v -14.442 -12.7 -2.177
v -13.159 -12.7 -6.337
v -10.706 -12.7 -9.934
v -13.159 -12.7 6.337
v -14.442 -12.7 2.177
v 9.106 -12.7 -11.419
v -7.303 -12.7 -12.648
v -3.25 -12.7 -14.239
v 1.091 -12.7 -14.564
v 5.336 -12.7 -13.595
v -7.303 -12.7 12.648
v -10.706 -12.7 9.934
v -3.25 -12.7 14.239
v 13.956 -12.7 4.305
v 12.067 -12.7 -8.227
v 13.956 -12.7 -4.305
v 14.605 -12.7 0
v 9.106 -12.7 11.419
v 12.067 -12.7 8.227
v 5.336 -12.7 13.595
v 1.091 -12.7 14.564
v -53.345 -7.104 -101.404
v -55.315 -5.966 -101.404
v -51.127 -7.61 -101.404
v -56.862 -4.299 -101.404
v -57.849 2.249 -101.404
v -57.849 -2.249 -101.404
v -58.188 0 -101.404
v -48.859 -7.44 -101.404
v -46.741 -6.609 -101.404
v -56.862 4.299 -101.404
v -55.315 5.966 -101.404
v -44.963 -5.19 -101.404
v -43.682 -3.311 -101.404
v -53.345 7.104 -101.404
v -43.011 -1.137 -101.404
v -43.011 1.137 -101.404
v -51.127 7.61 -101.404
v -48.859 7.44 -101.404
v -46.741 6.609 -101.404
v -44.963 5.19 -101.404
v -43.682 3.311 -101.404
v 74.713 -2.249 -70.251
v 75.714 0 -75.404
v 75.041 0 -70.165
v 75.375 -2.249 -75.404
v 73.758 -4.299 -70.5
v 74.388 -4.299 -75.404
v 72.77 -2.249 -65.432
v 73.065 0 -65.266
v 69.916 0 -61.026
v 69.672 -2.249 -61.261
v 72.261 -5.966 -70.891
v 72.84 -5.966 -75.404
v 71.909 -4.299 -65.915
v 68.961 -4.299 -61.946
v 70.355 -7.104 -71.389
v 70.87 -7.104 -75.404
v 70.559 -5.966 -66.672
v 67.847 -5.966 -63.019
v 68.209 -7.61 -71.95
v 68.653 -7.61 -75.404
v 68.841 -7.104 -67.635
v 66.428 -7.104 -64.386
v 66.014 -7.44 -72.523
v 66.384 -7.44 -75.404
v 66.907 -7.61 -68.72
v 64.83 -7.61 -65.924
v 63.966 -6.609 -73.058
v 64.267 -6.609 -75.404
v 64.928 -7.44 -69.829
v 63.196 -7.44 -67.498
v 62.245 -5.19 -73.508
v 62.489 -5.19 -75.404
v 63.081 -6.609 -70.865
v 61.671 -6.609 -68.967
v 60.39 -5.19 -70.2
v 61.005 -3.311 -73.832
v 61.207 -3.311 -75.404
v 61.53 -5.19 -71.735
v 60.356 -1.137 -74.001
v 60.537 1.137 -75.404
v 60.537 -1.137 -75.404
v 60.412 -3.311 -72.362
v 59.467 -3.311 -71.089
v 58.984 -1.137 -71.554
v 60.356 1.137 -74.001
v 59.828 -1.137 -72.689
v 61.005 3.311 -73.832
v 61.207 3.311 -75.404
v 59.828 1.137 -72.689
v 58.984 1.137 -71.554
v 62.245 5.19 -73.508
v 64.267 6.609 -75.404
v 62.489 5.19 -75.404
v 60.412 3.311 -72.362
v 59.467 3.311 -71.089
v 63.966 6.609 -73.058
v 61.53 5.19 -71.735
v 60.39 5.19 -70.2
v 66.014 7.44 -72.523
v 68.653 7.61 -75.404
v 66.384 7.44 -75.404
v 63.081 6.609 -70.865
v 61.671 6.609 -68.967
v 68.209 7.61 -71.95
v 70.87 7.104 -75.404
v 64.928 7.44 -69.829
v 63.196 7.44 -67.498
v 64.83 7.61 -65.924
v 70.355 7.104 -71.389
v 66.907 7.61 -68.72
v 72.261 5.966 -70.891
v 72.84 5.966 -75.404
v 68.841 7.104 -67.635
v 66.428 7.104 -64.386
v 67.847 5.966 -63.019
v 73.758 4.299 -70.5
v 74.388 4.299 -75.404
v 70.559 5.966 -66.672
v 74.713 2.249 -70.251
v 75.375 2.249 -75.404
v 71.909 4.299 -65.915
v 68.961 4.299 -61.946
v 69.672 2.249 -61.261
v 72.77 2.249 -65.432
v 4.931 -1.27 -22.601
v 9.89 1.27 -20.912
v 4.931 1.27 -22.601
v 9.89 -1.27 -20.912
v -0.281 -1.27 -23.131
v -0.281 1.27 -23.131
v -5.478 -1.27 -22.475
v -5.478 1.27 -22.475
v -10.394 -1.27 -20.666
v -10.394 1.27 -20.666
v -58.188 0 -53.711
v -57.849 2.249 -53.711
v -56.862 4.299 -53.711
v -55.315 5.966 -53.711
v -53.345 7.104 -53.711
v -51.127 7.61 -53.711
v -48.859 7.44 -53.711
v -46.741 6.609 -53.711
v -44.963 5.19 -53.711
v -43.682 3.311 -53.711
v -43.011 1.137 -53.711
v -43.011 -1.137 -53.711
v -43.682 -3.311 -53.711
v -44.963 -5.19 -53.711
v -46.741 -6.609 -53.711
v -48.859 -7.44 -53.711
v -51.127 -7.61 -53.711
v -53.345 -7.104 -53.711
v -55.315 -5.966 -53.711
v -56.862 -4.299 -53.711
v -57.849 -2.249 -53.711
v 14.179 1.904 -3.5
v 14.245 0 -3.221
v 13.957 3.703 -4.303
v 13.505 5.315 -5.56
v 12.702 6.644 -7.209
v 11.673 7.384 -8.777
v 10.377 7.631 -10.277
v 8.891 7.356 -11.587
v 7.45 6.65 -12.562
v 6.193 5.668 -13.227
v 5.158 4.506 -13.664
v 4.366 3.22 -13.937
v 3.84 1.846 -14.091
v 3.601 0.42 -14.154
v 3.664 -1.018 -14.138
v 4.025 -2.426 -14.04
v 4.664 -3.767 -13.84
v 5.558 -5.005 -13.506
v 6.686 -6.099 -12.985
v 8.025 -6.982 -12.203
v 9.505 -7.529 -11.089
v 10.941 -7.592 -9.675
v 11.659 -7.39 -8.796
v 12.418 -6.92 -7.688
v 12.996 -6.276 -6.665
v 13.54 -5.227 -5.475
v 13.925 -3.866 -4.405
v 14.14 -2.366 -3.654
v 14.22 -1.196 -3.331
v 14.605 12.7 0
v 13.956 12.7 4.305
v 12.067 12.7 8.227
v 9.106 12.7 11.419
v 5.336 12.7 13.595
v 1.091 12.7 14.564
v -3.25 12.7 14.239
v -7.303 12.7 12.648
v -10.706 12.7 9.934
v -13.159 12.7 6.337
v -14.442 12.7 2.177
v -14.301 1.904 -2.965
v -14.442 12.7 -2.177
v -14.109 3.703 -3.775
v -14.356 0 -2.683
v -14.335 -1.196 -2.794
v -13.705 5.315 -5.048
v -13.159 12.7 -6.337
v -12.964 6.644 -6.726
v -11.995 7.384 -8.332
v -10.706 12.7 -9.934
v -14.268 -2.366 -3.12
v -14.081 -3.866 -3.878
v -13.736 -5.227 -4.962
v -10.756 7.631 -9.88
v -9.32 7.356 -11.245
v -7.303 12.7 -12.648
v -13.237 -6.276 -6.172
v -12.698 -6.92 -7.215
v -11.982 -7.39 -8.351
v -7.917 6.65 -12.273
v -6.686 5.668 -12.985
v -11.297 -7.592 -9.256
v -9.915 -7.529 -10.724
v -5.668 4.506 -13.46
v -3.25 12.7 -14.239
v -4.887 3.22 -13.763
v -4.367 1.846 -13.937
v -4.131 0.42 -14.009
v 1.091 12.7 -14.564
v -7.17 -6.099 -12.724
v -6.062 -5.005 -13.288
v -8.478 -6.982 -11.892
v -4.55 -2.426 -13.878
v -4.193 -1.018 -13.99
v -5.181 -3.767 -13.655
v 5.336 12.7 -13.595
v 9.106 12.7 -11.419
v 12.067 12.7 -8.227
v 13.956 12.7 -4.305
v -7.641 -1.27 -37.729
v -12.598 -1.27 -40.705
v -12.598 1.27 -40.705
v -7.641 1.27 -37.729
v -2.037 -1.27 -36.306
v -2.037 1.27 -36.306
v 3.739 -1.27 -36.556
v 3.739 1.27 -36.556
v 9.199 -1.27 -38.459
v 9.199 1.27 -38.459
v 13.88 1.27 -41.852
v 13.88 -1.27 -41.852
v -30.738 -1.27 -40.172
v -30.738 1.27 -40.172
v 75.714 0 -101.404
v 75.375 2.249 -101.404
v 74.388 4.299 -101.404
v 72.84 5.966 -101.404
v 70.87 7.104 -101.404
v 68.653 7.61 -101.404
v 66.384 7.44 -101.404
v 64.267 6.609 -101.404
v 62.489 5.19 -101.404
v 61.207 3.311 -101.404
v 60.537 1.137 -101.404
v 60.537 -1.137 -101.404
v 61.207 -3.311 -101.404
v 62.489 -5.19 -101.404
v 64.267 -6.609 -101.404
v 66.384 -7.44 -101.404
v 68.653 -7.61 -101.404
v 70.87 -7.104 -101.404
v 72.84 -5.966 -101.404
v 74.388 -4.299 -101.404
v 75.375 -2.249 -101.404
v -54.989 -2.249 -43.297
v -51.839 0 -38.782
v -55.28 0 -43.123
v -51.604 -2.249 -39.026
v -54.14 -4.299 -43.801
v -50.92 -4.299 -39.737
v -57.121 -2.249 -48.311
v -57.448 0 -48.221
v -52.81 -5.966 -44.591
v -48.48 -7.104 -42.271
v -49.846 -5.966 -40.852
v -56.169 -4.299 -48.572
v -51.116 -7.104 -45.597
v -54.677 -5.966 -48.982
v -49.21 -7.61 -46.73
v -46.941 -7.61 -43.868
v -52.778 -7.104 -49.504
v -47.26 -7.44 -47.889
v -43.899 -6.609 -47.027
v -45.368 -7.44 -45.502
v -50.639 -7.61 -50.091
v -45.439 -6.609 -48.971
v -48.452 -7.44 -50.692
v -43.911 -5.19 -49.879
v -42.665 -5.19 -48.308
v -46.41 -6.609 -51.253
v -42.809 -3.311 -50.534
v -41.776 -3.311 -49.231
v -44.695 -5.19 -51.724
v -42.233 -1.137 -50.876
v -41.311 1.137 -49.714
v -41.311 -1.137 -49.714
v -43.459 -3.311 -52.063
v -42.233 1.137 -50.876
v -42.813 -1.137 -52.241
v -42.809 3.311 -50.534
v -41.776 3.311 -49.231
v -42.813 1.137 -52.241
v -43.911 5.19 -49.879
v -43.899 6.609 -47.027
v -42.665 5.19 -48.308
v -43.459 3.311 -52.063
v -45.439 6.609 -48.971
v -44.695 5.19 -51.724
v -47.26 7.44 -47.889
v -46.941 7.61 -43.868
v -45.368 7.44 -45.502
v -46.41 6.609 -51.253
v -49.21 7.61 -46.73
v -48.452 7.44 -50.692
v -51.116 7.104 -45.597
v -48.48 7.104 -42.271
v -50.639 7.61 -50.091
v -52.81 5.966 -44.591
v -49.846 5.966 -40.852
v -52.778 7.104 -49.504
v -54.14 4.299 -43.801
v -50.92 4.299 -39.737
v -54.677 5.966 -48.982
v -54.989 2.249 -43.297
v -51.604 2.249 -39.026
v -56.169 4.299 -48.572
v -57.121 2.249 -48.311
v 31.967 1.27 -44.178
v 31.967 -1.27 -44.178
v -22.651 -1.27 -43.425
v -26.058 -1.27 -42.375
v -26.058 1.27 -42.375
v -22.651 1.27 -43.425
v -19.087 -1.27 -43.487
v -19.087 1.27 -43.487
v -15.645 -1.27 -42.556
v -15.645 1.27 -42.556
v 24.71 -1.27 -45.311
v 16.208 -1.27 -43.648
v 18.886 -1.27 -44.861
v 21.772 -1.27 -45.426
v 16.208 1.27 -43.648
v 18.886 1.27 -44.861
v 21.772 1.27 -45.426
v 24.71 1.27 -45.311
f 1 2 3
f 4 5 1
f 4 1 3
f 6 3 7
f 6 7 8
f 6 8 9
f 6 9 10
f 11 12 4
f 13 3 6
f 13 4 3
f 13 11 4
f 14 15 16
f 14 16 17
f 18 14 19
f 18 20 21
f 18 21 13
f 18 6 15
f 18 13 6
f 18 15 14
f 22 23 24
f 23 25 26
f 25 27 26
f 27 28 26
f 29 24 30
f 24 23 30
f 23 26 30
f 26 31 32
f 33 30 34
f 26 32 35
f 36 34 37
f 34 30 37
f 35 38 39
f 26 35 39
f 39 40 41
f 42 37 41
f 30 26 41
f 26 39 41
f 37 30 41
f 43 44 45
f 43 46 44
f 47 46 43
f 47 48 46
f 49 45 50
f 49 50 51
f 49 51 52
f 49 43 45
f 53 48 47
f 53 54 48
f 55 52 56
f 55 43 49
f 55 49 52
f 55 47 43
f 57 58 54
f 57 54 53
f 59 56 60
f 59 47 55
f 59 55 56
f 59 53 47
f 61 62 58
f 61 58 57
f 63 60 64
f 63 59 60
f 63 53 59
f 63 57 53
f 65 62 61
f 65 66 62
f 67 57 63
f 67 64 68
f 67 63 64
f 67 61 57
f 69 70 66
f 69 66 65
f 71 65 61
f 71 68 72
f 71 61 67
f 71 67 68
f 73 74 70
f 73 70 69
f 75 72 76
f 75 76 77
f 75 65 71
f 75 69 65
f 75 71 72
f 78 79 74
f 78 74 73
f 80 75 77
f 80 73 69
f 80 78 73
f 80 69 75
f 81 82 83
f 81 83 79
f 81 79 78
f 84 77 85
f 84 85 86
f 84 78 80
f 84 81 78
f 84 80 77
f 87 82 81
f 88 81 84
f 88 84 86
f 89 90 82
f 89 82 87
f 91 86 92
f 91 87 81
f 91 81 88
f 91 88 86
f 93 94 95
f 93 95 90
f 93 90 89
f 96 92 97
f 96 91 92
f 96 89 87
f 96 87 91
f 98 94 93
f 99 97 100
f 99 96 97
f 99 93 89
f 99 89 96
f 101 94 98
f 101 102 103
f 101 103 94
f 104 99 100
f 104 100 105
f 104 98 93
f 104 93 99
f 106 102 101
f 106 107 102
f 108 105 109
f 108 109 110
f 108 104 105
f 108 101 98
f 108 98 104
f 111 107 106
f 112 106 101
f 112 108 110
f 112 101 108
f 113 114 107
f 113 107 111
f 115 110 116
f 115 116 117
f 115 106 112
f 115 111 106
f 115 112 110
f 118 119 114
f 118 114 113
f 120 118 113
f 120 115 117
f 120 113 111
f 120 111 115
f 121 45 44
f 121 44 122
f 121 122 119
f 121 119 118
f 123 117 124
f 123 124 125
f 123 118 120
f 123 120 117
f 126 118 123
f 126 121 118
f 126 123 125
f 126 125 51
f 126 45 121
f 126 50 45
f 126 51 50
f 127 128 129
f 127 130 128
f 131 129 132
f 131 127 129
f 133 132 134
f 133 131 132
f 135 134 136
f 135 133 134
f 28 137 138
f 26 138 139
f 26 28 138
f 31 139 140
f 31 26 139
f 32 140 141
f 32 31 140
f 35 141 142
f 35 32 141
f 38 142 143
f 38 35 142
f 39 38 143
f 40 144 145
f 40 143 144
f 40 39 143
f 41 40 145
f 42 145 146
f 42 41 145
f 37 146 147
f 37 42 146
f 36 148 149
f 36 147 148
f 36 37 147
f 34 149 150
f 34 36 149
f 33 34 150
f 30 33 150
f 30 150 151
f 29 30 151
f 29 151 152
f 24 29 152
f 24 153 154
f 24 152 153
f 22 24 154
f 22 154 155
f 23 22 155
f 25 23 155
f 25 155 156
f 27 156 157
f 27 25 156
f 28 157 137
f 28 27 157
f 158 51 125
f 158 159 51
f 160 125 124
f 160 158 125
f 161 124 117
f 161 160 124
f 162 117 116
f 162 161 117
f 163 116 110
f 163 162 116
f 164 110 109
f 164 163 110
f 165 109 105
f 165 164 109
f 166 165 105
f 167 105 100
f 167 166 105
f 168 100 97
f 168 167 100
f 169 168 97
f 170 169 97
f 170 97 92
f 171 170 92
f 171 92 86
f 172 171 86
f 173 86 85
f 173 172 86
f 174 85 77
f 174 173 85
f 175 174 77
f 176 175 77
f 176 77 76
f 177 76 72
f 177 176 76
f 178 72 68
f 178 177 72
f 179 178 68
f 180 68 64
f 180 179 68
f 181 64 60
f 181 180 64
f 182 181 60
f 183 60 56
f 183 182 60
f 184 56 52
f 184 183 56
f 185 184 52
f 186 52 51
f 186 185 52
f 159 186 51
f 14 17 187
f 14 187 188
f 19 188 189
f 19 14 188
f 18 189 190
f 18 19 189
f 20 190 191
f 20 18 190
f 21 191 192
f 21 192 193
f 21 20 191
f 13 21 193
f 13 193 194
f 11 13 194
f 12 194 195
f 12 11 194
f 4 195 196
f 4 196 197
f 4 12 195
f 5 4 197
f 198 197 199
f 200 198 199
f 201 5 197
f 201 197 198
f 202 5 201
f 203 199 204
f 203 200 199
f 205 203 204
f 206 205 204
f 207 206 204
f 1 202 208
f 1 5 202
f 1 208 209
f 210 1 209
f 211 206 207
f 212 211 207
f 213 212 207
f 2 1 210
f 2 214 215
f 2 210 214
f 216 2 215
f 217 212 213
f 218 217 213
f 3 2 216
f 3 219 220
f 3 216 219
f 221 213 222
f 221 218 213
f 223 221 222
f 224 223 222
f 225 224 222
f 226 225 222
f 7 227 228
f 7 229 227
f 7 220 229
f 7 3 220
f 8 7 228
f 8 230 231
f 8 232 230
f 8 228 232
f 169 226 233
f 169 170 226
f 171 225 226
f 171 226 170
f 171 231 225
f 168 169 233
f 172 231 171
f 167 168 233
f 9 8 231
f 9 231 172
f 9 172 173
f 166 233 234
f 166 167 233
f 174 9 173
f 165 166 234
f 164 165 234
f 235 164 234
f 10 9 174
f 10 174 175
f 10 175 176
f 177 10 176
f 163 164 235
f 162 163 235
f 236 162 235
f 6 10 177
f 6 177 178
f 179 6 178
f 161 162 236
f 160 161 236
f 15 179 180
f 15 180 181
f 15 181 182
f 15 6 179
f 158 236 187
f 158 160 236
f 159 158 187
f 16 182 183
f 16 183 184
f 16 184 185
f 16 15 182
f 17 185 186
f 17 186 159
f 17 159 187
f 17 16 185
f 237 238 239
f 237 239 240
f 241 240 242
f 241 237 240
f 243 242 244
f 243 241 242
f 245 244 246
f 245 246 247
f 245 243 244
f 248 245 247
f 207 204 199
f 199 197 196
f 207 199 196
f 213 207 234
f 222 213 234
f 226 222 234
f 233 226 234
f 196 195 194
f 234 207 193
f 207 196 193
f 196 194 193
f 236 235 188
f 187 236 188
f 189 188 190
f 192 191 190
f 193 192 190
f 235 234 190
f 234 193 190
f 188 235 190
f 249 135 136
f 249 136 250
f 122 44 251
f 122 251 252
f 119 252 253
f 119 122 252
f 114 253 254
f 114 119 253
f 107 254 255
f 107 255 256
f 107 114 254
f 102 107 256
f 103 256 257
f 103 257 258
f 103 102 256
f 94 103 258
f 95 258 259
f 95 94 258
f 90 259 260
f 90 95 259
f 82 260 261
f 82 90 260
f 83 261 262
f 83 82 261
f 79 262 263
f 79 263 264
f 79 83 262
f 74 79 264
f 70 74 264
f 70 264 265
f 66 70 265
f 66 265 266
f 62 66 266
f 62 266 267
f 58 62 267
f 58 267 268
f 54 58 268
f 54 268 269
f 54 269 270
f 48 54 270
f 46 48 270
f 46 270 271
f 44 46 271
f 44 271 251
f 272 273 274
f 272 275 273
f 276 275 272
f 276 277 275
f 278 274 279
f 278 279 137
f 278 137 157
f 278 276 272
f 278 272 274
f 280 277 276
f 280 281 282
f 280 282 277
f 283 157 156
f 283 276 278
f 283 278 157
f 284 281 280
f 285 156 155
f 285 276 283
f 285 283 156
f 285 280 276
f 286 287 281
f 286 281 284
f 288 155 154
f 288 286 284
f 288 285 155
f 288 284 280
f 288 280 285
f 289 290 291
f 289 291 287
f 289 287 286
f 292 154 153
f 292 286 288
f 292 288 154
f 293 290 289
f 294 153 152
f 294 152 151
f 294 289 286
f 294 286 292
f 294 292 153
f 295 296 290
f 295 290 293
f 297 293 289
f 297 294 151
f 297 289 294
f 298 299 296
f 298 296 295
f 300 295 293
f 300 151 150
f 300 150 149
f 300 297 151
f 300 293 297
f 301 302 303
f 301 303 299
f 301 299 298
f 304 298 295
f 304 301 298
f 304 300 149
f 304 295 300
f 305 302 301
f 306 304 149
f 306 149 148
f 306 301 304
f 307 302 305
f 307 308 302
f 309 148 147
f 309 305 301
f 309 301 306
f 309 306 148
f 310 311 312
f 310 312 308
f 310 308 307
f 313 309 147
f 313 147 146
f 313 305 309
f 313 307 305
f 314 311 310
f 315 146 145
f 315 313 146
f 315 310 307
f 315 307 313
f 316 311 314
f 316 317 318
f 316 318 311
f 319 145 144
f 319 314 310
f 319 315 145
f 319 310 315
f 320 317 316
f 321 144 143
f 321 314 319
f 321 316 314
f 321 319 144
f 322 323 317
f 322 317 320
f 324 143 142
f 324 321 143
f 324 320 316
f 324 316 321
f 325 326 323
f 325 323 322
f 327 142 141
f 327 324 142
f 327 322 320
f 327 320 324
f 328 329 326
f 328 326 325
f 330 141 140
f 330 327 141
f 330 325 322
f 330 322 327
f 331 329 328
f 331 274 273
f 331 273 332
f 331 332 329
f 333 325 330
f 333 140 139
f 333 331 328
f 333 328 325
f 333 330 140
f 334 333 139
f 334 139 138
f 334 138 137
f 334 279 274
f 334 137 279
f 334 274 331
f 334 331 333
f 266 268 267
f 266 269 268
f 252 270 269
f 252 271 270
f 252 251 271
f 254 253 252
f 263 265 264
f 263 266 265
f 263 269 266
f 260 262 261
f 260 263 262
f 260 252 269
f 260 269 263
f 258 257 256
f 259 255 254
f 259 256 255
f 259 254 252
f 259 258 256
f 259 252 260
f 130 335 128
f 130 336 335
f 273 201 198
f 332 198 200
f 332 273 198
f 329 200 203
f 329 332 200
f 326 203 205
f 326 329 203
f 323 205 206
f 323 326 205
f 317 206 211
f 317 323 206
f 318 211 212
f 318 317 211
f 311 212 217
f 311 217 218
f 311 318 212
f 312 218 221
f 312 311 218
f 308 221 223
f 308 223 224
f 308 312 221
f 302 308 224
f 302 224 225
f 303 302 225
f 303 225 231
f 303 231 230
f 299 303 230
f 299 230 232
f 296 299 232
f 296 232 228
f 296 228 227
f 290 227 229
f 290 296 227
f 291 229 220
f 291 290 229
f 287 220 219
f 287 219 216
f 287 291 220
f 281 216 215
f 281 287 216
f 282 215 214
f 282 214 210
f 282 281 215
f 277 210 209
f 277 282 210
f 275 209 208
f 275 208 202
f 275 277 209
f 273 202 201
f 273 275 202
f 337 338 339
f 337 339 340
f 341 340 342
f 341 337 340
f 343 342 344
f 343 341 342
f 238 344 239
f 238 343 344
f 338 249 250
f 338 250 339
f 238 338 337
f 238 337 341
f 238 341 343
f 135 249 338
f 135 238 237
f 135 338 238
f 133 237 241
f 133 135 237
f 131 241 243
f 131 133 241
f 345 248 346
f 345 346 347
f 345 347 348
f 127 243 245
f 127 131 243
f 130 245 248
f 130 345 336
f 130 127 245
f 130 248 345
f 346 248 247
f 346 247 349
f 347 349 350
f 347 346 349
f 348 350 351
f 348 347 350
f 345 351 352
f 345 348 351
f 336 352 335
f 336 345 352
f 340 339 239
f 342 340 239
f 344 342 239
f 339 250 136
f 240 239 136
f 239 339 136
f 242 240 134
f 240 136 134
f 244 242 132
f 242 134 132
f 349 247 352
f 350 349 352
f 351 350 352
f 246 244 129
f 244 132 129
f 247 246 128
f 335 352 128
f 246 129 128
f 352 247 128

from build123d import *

# Parameters (mm, degrees)
F3_R     = 14.605
F4_DEPTH = 12.7
F2_R     = 7.6311340138
F7_DEPTH = 1.27


with BuildPart() as f4:
    # F3 (on Front) → F4 (new body, symmetric)
    with BuildSketch(Plane.XZ):
        Circle(F3_R)
    extrude(amount=F4_DEPTH, both=True)

    # F5: sweep along a path in F0
    with BuildLine(Plane.XZ) as f5_path:
        Line((67.6874214057, -101.4042571187), (67.6874214057, -75.40361079))
        ThreePointArc((67.6874214057, -75.40361079), (66.7658728333, -70.6540758688), (64.1349675525, -66.59382081))
        Line((64.1349675525, -66.59382081), (0, 0))
        Line((0, 0), (-46.2717179185, -44.5632205993))
        ThreePointArc((-46.2717179185, -44.5632205993), (-49.1489791651, -48.74057222), (-50.1619279385, -53.710766746))
        Line((-50.1619279385, -53.710766746), (-50.1619279385, -101.4042571187))
    # F2 (on line) → F5 (sweep)
    with BuildSketch(Plane(origin=(0, 0, -101.4042571187), x_dir=(1, 0, 0), z_dir=(0, 0, -1))):
        with Locations((68.0825263262, 0)):
            Circle(F2_R)
    sweep(path=f5_path.line, transition=Transition.RIGHT)


with BuildPart() as f7:
    # F6 (on Front) → F7 (new body, symmetric)
    with BuildSketch(Plane.XZ):
        with BuildLine():
            ThreePointArc((9.8897112632, -20.9123172234), (-0.2808074344, -23.1312029023), (-10.3944632585, -20.6660720527))
            Line((-10.3944632585, -20.6660720527), (-30.738119036, -40.172085166))
            Line((-30.738119036, -40.172085166), (-26.0577209294, -42.374760996))
            ThreePointArc((-26.0577209294, -42.374760996), (-19.0865137753, -43.4871060906), (-12.5983355416, -40.7052750384))
            ThreePointArc((-12.5983355416, -40.7052750384), (0.8598543979, -36.2199679132), (13.8798569548, -41.8520536613))
            ThreePointArc((13.8798569548, -41.8520536613), (18.8860975869, -44.8611972259), (24.7097382477, -45.3113080046))
            Line((24.7097382477, -45.3113080046), (31.9666825235, -44.1781245172))
            Line((31.9666825235, -44.1781245172), (9.8897112632, -20.9123172234))
        make_face()
    extrude(amount=F7_DEPTH, both=True)


solid = Compound([f4.part, f7.part])
